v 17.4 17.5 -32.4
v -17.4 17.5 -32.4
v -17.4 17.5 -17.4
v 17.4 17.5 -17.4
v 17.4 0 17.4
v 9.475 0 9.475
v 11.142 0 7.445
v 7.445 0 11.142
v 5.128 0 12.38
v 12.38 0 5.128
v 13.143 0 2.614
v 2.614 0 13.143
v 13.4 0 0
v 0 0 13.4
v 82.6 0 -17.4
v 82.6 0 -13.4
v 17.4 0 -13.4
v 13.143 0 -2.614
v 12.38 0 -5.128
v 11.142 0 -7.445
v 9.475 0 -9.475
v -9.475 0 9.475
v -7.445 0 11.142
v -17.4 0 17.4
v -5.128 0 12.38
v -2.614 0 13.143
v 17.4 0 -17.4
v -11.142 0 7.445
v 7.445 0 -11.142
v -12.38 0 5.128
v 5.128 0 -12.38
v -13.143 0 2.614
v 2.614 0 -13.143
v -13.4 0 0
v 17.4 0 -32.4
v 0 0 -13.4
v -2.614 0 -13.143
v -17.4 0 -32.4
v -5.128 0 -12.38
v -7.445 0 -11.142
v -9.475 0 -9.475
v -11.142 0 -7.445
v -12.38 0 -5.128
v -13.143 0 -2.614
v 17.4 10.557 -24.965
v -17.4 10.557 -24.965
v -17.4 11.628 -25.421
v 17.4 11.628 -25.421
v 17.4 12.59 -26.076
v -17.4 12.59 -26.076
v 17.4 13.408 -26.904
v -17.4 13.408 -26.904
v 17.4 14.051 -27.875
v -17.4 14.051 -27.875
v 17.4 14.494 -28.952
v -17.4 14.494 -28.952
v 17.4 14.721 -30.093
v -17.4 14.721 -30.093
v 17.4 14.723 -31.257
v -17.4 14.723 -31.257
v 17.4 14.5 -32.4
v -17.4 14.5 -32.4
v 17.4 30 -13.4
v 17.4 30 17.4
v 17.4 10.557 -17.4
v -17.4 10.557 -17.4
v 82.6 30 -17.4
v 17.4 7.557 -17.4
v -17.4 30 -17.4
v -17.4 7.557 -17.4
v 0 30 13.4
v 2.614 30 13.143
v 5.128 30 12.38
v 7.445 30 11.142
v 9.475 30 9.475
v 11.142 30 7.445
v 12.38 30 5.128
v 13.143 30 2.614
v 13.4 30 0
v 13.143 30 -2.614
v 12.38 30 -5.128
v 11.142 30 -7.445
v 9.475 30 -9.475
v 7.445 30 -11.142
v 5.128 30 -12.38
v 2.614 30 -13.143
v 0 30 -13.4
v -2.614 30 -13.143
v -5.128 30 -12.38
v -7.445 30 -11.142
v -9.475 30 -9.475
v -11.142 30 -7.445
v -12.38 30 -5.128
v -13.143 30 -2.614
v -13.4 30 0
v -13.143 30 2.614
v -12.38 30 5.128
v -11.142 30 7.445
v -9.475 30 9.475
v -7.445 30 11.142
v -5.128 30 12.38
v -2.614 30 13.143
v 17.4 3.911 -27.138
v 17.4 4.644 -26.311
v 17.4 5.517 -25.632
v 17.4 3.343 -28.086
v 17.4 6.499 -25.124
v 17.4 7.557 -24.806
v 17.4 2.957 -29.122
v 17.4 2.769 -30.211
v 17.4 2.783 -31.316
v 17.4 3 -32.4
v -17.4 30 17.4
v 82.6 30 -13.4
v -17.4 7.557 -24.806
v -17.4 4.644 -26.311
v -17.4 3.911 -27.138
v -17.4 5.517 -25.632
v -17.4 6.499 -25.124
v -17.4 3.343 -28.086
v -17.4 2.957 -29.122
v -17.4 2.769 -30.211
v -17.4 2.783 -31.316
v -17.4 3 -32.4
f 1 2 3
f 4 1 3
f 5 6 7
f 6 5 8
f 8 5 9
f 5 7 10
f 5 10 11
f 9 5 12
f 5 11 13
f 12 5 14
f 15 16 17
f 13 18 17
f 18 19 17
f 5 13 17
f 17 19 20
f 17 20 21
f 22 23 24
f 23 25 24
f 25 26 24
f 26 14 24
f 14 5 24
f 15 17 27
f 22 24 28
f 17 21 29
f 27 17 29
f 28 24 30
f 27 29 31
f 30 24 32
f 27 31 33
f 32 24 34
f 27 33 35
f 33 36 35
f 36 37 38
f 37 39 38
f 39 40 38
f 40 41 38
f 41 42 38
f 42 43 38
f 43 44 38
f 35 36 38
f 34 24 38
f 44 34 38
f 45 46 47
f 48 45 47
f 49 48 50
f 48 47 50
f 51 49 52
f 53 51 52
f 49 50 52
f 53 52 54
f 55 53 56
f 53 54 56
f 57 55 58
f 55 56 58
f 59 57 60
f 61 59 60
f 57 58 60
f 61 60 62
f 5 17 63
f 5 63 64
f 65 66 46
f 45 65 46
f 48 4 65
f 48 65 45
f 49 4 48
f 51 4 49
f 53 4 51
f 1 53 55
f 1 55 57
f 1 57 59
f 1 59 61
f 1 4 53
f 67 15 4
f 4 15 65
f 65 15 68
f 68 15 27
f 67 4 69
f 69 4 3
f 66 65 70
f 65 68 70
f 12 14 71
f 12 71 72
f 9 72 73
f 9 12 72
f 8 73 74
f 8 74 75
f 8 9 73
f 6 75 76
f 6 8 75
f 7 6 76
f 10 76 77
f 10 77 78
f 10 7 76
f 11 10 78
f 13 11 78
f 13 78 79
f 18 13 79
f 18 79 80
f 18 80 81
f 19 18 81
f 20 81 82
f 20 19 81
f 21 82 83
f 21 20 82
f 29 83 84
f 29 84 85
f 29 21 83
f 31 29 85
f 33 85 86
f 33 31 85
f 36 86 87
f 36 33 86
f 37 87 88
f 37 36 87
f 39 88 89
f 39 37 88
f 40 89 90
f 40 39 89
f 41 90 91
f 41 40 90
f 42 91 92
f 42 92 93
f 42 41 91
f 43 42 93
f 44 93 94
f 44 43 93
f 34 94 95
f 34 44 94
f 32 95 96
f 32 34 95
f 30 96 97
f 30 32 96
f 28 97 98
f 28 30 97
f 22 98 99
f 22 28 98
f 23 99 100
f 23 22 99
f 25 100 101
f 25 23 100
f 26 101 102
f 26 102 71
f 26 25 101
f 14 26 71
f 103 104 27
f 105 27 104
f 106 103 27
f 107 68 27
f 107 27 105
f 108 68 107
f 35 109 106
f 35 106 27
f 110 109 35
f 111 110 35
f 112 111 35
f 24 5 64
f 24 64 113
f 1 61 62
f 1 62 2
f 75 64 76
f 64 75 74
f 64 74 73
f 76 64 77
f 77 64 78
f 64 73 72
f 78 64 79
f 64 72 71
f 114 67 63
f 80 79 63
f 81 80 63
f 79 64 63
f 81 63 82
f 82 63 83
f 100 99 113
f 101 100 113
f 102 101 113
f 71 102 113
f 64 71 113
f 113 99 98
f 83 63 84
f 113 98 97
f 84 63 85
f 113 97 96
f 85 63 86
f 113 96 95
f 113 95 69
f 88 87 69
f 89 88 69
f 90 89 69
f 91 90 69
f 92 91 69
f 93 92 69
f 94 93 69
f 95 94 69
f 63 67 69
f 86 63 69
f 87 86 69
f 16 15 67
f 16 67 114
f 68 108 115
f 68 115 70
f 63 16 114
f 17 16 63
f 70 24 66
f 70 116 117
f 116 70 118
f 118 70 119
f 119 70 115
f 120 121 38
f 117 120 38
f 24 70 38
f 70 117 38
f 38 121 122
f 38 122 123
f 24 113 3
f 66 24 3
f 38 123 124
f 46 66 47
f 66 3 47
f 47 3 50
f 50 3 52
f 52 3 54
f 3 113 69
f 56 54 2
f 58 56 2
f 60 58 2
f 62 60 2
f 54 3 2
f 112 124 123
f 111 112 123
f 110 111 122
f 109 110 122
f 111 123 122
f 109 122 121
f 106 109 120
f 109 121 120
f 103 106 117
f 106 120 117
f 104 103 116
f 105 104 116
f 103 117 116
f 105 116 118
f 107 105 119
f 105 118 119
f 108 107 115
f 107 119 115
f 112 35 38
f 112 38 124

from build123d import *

# Parameters (mm, degrees)
SKETCH1_R           = 13.4
BOSS_EXTRUDE1_DEPTH = 30
BOSS_EXTRUDE2_DEPTH = 34.8


with BuildPart() as part:
    # Sketch1 → Boss-Extrude1 (new body)
    with BuildSketch(Plane(origin=(0, 0, 0), x_dir=(1, 0, 0), z_dir=(0, 1, 0))):
        Polygon((-17.4, 17.4), (17.4, 17.4), (82.6, 17.4), (82.6, 13.4), (17.4, 13.4), (17.4, -17.4), (-17.4, -17.4), align=None)
        with Locations(Location((0, 0, 0), (0, 0, 270))):
            Circle(SKETCH1_R, mode=Mode.SUBTRACT)
    extrude(amount=BOSS_EXTRUDE1_DEPTH)

    # Sketch3 → Boss-Extrude2 (add)
    with BuildSketch(Plane.ZY.offset(17.4)):
        with BuildLine():
            Line((-17.4, 0), (-32.4, 0))
            Line((-32.4, 0), (-32.4, 3))
            ThreePointArc((-32.4, 3), (-27.598787547, 3.605237022), (-24.805858924, 7.557135626))
            Line((-24.805858924, 7.557135626), (-17.4, 7.557135626))
            Line((-17.4, 7.557135626), (-17.4, 0))
        make_face()
        with BuildLine():
            Line((-32.4, 14.5), (-32.4, 17.5))
            Line((-32.4, 17.5), (-17.4, 17.5))
            Line((-17.4, 17.5), (-17.4, 10.557135626))
            Line((-17.4, 10.557135626), (-24.964700082, 10.557135626))
            ThreePointArc((-24.964700082, 10.557135626), (-27.875124937, 14.050801443), (-32.4, 14.5))
        make_face()
    extrude(amount=-BOSS_EXTRUDE2_DEPTH)


solid = part.part
